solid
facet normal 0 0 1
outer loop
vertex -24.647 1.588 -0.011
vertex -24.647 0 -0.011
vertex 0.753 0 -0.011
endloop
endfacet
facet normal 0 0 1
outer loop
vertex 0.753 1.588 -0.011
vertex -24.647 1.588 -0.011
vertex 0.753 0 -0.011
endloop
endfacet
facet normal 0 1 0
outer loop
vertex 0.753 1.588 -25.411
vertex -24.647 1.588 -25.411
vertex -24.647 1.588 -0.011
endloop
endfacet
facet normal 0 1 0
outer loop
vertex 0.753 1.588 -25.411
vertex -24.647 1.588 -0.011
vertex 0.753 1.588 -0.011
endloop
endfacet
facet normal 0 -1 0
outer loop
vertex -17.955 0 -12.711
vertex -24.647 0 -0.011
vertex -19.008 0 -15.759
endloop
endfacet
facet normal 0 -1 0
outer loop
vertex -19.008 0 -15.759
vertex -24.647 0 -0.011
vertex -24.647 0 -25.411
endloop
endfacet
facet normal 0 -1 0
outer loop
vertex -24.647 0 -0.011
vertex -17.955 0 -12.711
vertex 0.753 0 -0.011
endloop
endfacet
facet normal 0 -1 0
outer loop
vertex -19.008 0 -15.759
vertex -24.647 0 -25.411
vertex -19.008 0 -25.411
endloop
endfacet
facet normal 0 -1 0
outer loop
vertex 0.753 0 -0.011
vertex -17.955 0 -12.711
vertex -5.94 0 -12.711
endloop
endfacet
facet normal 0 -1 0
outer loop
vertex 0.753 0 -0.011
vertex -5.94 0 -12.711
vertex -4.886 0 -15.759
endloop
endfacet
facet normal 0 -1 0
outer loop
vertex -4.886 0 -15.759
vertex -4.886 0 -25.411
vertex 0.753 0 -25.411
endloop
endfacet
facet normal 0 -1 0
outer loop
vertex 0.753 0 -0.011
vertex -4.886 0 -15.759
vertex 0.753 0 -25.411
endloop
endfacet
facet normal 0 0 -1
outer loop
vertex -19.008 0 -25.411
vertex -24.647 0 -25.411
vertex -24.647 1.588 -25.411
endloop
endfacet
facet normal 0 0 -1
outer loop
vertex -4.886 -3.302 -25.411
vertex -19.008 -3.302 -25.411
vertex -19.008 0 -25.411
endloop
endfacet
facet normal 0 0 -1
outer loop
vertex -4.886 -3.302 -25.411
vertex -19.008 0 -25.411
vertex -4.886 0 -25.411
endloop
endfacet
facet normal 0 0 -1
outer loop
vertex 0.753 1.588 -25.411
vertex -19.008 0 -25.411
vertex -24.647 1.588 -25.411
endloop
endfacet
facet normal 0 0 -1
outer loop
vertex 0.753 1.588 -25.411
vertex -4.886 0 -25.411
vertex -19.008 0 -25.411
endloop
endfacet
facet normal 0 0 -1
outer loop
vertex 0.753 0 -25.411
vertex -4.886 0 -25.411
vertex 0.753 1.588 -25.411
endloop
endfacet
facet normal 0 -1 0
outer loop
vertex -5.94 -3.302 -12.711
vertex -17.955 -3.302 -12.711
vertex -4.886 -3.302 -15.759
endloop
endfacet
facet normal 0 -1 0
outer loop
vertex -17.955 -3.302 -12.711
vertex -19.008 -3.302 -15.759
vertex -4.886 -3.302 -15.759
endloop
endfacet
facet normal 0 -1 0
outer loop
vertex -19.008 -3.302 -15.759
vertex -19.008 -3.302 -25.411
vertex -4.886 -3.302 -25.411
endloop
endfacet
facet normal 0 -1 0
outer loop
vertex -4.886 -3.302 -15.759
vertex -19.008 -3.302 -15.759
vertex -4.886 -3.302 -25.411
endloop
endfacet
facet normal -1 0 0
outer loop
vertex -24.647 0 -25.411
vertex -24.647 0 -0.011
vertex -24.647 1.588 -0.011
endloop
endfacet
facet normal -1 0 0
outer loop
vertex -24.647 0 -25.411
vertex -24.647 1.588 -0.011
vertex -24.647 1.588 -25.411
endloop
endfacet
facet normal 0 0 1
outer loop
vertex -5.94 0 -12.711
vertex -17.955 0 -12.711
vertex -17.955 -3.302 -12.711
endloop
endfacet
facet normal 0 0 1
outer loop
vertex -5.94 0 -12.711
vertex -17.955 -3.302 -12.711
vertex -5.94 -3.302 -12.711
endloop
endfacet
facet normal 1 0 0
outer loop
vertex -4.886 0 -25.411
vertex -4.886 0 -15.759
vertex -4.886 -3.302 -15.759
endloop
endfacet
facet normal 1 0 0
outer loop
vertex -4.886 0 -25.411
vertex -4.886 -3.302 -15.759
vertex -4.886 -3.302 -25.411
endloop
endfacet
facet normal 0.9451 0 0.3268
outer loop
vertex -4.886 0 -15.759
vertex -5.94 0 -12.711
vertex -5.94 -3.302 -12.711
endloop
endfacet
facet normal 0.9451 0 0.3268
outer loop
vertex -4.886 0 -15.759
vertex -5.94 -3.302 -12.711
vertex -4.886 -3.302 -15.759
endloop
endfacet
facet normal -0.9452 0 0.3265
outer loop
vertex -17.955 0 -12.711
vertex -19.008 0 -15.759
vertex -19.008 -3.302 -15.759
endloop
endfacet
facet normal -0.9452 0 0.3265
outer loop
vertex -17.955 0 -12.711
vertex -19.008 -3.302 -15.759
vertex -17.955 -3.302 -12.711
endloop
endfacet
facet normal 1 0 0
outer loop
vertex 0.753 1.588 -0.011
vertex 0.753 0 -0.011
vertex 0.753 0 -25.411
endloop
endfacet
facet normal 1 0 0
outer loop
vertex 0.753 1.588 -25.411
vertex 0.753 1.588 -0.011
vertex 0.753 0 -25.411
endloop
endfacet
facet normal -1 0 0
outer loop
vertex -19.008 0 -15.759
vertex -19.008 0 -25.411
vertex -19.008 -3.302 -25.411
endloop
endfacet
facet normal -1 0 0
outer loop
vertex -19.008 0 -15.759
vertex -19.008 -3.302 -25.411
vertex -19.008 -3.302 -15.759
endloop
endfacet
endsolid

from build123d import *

# Parameters (mm, degrees)
SKETCH1_W           = 25.4
SKETCH1_H           = 25.4
BOSS_EXTRUDE1_DEPTH = 1.5875
BOSS_EXTRUDE2_DEPTH = 3.302


with BuildPart() as part:
    # Sketch1 → Boss-Extrude1 (new body)
    with BuildSketch(Plane(origin=(0, 0, 0), x_dir=(1, 0, 0), z_dir=(0, 1, 0))):
        with Locations((-11.947275054, 12.711155892)):
            Rectangle(SKETCH1_W, SKETCH1_H)
    extrude(amount=BOSS_EXTRUDE1_DEPTH)

    # Sketch2 → Boss-Extrude2 (add)
    with BuildSketch(Plane(origin=(0, 0, 0), x_dir=(-1, 0, 0), z_dir=(0, -1, 0))):
        Polygon((17.95497638, 12.711155892), (5.939573728, 12.711155892), (4.886075054, 15.759155892), (4.886075054, 25.411155892), (19.008475054, 25.411155892), (19.008475054, 15.759155892), align=None)
    extrude(amount=BOSS_EXTRUDE2_DEPTH)


solid = part.part
